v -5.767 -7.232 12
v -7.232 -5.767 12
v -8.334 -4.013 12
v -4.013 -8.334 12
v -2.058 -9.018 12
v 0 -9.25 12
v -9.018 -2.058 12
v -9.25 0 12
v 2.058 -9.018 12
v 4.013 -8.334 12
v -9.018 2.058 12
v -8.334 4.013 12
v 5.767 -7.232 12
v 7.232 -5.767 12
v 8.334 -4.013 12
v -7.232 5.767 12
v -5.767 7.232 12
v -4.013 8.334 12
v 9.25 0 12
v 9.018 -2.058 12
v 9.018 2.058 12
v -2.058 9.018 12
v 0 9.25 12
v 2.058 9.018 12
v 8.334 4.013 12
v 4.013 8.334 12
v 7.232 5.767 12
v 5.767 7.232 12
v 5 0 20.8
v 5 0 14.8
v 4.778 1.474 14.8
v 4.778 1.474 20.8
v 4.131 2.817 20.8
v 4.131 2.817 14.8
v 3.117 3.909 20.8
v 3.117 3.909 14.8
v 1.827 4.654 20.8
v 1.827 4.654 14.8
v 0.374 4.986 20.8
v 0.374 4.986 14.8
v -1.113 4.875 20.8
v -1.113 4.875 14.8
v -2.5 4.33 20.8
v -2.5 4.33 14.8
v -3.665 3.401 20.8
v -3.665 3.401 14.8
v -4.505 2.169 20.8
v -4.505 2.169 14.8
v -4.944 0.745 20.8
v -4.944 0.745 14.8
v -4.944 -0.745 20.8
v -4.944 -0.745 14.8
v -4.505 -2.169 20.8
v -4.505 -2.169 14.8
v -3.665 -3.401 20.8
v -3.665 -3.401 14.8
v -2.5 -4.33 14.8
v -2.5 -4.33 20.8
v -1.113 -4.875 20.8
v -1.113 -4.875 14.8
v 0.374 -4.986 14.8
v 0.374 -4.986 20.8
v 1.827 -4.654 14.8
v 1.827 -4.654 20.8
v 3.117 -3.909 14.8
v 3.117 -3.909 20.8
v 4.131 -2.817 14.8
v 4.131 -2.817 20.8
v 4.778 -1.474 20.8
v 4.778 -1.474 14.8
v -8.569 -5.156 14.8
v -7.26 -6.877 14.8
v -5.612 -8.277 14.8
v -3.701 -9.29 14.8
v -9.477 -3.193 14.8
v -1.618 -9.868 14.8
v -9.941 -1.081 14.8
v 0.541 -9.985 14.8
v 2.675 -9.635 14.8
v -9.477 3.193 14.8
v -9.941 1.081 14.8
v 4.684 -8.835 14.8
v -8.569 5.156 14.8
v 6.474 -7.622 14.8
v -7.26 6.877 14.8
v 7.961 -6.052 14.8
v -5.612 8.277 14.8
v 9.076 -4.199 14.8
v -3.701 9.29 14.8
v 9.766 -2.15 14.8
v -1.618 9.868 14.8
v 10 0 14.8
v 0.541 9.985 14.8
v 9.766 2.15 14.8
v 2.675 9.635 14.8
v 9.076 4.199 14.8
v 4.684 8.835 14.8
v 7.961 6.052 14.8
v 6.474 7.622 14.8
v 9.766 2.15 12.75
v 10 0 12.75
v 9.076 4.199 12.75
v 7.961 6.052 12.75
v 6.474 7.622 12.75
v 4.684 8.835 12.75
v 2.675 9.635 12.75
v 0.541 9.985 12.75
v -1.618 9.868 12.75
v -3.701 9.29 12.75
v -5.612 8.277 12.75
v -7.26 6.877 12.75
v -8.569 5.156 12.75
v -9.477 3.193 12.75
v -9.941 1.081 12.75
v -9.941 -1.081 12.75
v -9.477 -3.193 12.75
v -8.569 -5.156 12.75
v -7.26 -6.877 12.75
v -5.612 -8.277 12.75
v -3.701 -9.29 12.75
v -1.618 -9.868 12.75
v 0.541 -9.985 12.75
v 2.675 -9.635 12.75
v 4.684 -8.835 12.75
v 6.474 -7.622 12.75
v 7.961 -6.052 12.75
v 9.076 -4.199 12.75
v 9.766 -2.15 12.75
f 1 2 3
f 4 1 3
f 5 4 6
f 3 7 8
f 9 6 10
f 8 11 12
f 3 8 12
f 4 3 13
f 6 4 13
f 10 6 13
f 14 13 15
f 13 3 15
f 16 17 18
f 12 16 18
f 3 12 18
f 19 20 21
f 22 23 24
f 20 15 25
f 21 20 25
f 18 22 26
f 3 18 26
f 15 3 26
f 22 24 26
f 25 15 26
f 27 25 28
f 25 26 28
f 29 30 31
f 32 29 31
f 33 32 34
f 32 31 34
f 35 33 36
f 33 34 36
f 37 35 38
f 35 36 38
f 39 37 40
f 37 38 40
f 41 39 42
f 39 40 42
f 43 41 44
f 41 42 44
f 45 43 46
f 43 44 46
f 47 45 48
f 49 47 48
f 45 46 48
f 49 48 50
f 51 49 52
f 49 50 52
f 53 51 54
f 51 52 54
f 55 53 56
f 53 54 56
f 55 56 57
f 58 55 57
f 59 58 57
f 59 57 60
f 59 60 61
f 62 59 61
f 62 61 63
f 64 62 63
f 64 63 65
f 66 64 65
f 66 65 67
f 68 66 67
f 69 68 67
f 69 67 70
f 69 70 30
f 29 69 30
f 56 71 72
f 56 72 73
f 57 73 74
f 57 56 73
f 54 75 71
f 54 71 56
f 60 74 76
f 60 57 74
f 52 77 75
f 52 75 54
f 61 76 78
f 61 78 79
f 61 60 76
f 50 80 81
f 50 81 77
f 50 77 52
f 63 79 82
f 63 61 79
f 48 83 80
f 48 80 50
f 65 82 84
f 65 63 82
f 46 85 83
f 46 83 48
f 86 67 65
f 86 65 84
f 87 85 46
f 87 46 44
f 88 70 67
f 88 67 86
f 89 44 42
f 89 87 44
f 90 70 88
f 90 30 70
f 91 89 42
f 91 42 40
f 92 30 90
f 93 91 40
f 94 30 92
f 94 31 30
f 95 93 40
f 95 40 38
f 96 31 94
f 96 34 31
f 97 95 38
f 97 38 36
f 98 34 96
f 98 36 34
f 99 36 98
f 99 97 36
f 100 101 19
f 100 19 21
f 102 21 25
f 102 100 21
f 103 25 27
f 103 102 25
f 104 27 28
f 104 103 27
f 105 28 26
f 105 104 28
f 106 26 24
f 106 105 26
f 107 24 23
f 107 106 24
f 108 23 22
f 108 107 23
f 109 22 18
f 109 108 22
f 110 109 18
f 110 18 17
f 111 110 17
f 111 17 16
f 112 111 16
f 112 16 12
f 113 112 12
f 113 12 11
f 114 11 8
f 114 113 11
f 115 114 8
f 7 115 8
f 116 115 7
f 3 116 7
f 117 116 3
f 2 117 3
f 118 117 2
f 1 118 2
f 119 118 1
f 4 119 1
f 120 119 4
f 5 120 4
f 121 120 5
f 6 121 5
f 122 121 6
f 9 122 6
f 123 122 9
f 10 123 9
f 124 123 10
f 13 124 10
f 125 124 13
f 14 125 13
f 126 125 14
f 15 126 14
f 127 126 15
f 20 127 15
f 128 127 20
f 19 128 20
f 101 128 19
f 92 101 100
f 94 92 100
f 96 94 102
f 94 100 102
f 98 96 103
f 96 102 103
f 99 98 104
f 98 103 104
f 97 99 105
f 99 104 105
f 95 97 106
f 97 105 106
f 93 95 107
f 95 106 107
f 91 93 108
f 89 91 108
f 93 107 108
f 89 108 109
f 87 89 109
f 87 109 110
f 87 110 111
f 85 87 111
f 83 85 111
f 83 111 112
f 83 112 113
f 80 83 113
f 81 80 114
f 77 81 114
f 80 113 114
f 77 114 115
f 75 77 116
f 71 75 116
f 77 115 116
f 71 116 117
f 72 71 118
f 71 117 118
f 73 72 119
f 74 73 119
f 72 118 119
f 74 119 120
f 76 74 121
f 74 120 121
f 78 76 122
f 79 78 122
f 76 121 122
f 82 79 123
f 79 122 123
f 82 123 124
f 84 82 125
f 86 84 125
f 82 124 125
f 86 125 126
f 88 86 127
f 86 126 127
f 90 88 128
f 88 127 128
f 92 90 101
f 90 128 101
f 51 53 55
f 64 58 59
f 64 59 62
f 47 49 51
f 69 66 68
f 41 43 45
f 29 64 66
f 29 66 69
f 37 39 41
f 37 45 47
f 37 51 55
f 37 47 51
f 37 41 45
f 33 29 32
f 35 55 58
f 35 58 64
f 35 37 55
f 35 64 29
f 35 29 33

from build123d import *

# Parameters (mm, degrees)
CYLINDER093_R     = 5
CYLINDER093_DEPTH = 8.8
CYLINDER092_R     = 10
CYLINDER092_DEPTH = 2.8
CHAMFER004_SIZE   = 0.75


with BuildPart() as cylinder093:
    # Cylinder093 → Cylinder093 (new body)
    with BuildSketch(Plane.XY.offset(12)):
        Circle(CYLINDER093_R)
    extrude(amount=CYLINDER093_DEPTH)


with BuildPart() as hub_rear_support:
    # Cylinder092 → Cylinder092 (new body)
    with BuildSketch(Plane.XY.offset(12)):
        Circle(CYLINDER092_R)
    extrude(amount=CYLINDER092_DEPTH)

    # Fusion047: union Cylinder093
    add(cylinder093.part)

    # Chamfer004
    chamfer004_edges = [hub_rear_support.edges().sort_by_distance(p)[0] for p in [
        (-10, 0, 12),
    ]]
    chamfer(chamfer004_edges, length=CHAMFER004_SIZE)


solid = hub_rear_support.part
